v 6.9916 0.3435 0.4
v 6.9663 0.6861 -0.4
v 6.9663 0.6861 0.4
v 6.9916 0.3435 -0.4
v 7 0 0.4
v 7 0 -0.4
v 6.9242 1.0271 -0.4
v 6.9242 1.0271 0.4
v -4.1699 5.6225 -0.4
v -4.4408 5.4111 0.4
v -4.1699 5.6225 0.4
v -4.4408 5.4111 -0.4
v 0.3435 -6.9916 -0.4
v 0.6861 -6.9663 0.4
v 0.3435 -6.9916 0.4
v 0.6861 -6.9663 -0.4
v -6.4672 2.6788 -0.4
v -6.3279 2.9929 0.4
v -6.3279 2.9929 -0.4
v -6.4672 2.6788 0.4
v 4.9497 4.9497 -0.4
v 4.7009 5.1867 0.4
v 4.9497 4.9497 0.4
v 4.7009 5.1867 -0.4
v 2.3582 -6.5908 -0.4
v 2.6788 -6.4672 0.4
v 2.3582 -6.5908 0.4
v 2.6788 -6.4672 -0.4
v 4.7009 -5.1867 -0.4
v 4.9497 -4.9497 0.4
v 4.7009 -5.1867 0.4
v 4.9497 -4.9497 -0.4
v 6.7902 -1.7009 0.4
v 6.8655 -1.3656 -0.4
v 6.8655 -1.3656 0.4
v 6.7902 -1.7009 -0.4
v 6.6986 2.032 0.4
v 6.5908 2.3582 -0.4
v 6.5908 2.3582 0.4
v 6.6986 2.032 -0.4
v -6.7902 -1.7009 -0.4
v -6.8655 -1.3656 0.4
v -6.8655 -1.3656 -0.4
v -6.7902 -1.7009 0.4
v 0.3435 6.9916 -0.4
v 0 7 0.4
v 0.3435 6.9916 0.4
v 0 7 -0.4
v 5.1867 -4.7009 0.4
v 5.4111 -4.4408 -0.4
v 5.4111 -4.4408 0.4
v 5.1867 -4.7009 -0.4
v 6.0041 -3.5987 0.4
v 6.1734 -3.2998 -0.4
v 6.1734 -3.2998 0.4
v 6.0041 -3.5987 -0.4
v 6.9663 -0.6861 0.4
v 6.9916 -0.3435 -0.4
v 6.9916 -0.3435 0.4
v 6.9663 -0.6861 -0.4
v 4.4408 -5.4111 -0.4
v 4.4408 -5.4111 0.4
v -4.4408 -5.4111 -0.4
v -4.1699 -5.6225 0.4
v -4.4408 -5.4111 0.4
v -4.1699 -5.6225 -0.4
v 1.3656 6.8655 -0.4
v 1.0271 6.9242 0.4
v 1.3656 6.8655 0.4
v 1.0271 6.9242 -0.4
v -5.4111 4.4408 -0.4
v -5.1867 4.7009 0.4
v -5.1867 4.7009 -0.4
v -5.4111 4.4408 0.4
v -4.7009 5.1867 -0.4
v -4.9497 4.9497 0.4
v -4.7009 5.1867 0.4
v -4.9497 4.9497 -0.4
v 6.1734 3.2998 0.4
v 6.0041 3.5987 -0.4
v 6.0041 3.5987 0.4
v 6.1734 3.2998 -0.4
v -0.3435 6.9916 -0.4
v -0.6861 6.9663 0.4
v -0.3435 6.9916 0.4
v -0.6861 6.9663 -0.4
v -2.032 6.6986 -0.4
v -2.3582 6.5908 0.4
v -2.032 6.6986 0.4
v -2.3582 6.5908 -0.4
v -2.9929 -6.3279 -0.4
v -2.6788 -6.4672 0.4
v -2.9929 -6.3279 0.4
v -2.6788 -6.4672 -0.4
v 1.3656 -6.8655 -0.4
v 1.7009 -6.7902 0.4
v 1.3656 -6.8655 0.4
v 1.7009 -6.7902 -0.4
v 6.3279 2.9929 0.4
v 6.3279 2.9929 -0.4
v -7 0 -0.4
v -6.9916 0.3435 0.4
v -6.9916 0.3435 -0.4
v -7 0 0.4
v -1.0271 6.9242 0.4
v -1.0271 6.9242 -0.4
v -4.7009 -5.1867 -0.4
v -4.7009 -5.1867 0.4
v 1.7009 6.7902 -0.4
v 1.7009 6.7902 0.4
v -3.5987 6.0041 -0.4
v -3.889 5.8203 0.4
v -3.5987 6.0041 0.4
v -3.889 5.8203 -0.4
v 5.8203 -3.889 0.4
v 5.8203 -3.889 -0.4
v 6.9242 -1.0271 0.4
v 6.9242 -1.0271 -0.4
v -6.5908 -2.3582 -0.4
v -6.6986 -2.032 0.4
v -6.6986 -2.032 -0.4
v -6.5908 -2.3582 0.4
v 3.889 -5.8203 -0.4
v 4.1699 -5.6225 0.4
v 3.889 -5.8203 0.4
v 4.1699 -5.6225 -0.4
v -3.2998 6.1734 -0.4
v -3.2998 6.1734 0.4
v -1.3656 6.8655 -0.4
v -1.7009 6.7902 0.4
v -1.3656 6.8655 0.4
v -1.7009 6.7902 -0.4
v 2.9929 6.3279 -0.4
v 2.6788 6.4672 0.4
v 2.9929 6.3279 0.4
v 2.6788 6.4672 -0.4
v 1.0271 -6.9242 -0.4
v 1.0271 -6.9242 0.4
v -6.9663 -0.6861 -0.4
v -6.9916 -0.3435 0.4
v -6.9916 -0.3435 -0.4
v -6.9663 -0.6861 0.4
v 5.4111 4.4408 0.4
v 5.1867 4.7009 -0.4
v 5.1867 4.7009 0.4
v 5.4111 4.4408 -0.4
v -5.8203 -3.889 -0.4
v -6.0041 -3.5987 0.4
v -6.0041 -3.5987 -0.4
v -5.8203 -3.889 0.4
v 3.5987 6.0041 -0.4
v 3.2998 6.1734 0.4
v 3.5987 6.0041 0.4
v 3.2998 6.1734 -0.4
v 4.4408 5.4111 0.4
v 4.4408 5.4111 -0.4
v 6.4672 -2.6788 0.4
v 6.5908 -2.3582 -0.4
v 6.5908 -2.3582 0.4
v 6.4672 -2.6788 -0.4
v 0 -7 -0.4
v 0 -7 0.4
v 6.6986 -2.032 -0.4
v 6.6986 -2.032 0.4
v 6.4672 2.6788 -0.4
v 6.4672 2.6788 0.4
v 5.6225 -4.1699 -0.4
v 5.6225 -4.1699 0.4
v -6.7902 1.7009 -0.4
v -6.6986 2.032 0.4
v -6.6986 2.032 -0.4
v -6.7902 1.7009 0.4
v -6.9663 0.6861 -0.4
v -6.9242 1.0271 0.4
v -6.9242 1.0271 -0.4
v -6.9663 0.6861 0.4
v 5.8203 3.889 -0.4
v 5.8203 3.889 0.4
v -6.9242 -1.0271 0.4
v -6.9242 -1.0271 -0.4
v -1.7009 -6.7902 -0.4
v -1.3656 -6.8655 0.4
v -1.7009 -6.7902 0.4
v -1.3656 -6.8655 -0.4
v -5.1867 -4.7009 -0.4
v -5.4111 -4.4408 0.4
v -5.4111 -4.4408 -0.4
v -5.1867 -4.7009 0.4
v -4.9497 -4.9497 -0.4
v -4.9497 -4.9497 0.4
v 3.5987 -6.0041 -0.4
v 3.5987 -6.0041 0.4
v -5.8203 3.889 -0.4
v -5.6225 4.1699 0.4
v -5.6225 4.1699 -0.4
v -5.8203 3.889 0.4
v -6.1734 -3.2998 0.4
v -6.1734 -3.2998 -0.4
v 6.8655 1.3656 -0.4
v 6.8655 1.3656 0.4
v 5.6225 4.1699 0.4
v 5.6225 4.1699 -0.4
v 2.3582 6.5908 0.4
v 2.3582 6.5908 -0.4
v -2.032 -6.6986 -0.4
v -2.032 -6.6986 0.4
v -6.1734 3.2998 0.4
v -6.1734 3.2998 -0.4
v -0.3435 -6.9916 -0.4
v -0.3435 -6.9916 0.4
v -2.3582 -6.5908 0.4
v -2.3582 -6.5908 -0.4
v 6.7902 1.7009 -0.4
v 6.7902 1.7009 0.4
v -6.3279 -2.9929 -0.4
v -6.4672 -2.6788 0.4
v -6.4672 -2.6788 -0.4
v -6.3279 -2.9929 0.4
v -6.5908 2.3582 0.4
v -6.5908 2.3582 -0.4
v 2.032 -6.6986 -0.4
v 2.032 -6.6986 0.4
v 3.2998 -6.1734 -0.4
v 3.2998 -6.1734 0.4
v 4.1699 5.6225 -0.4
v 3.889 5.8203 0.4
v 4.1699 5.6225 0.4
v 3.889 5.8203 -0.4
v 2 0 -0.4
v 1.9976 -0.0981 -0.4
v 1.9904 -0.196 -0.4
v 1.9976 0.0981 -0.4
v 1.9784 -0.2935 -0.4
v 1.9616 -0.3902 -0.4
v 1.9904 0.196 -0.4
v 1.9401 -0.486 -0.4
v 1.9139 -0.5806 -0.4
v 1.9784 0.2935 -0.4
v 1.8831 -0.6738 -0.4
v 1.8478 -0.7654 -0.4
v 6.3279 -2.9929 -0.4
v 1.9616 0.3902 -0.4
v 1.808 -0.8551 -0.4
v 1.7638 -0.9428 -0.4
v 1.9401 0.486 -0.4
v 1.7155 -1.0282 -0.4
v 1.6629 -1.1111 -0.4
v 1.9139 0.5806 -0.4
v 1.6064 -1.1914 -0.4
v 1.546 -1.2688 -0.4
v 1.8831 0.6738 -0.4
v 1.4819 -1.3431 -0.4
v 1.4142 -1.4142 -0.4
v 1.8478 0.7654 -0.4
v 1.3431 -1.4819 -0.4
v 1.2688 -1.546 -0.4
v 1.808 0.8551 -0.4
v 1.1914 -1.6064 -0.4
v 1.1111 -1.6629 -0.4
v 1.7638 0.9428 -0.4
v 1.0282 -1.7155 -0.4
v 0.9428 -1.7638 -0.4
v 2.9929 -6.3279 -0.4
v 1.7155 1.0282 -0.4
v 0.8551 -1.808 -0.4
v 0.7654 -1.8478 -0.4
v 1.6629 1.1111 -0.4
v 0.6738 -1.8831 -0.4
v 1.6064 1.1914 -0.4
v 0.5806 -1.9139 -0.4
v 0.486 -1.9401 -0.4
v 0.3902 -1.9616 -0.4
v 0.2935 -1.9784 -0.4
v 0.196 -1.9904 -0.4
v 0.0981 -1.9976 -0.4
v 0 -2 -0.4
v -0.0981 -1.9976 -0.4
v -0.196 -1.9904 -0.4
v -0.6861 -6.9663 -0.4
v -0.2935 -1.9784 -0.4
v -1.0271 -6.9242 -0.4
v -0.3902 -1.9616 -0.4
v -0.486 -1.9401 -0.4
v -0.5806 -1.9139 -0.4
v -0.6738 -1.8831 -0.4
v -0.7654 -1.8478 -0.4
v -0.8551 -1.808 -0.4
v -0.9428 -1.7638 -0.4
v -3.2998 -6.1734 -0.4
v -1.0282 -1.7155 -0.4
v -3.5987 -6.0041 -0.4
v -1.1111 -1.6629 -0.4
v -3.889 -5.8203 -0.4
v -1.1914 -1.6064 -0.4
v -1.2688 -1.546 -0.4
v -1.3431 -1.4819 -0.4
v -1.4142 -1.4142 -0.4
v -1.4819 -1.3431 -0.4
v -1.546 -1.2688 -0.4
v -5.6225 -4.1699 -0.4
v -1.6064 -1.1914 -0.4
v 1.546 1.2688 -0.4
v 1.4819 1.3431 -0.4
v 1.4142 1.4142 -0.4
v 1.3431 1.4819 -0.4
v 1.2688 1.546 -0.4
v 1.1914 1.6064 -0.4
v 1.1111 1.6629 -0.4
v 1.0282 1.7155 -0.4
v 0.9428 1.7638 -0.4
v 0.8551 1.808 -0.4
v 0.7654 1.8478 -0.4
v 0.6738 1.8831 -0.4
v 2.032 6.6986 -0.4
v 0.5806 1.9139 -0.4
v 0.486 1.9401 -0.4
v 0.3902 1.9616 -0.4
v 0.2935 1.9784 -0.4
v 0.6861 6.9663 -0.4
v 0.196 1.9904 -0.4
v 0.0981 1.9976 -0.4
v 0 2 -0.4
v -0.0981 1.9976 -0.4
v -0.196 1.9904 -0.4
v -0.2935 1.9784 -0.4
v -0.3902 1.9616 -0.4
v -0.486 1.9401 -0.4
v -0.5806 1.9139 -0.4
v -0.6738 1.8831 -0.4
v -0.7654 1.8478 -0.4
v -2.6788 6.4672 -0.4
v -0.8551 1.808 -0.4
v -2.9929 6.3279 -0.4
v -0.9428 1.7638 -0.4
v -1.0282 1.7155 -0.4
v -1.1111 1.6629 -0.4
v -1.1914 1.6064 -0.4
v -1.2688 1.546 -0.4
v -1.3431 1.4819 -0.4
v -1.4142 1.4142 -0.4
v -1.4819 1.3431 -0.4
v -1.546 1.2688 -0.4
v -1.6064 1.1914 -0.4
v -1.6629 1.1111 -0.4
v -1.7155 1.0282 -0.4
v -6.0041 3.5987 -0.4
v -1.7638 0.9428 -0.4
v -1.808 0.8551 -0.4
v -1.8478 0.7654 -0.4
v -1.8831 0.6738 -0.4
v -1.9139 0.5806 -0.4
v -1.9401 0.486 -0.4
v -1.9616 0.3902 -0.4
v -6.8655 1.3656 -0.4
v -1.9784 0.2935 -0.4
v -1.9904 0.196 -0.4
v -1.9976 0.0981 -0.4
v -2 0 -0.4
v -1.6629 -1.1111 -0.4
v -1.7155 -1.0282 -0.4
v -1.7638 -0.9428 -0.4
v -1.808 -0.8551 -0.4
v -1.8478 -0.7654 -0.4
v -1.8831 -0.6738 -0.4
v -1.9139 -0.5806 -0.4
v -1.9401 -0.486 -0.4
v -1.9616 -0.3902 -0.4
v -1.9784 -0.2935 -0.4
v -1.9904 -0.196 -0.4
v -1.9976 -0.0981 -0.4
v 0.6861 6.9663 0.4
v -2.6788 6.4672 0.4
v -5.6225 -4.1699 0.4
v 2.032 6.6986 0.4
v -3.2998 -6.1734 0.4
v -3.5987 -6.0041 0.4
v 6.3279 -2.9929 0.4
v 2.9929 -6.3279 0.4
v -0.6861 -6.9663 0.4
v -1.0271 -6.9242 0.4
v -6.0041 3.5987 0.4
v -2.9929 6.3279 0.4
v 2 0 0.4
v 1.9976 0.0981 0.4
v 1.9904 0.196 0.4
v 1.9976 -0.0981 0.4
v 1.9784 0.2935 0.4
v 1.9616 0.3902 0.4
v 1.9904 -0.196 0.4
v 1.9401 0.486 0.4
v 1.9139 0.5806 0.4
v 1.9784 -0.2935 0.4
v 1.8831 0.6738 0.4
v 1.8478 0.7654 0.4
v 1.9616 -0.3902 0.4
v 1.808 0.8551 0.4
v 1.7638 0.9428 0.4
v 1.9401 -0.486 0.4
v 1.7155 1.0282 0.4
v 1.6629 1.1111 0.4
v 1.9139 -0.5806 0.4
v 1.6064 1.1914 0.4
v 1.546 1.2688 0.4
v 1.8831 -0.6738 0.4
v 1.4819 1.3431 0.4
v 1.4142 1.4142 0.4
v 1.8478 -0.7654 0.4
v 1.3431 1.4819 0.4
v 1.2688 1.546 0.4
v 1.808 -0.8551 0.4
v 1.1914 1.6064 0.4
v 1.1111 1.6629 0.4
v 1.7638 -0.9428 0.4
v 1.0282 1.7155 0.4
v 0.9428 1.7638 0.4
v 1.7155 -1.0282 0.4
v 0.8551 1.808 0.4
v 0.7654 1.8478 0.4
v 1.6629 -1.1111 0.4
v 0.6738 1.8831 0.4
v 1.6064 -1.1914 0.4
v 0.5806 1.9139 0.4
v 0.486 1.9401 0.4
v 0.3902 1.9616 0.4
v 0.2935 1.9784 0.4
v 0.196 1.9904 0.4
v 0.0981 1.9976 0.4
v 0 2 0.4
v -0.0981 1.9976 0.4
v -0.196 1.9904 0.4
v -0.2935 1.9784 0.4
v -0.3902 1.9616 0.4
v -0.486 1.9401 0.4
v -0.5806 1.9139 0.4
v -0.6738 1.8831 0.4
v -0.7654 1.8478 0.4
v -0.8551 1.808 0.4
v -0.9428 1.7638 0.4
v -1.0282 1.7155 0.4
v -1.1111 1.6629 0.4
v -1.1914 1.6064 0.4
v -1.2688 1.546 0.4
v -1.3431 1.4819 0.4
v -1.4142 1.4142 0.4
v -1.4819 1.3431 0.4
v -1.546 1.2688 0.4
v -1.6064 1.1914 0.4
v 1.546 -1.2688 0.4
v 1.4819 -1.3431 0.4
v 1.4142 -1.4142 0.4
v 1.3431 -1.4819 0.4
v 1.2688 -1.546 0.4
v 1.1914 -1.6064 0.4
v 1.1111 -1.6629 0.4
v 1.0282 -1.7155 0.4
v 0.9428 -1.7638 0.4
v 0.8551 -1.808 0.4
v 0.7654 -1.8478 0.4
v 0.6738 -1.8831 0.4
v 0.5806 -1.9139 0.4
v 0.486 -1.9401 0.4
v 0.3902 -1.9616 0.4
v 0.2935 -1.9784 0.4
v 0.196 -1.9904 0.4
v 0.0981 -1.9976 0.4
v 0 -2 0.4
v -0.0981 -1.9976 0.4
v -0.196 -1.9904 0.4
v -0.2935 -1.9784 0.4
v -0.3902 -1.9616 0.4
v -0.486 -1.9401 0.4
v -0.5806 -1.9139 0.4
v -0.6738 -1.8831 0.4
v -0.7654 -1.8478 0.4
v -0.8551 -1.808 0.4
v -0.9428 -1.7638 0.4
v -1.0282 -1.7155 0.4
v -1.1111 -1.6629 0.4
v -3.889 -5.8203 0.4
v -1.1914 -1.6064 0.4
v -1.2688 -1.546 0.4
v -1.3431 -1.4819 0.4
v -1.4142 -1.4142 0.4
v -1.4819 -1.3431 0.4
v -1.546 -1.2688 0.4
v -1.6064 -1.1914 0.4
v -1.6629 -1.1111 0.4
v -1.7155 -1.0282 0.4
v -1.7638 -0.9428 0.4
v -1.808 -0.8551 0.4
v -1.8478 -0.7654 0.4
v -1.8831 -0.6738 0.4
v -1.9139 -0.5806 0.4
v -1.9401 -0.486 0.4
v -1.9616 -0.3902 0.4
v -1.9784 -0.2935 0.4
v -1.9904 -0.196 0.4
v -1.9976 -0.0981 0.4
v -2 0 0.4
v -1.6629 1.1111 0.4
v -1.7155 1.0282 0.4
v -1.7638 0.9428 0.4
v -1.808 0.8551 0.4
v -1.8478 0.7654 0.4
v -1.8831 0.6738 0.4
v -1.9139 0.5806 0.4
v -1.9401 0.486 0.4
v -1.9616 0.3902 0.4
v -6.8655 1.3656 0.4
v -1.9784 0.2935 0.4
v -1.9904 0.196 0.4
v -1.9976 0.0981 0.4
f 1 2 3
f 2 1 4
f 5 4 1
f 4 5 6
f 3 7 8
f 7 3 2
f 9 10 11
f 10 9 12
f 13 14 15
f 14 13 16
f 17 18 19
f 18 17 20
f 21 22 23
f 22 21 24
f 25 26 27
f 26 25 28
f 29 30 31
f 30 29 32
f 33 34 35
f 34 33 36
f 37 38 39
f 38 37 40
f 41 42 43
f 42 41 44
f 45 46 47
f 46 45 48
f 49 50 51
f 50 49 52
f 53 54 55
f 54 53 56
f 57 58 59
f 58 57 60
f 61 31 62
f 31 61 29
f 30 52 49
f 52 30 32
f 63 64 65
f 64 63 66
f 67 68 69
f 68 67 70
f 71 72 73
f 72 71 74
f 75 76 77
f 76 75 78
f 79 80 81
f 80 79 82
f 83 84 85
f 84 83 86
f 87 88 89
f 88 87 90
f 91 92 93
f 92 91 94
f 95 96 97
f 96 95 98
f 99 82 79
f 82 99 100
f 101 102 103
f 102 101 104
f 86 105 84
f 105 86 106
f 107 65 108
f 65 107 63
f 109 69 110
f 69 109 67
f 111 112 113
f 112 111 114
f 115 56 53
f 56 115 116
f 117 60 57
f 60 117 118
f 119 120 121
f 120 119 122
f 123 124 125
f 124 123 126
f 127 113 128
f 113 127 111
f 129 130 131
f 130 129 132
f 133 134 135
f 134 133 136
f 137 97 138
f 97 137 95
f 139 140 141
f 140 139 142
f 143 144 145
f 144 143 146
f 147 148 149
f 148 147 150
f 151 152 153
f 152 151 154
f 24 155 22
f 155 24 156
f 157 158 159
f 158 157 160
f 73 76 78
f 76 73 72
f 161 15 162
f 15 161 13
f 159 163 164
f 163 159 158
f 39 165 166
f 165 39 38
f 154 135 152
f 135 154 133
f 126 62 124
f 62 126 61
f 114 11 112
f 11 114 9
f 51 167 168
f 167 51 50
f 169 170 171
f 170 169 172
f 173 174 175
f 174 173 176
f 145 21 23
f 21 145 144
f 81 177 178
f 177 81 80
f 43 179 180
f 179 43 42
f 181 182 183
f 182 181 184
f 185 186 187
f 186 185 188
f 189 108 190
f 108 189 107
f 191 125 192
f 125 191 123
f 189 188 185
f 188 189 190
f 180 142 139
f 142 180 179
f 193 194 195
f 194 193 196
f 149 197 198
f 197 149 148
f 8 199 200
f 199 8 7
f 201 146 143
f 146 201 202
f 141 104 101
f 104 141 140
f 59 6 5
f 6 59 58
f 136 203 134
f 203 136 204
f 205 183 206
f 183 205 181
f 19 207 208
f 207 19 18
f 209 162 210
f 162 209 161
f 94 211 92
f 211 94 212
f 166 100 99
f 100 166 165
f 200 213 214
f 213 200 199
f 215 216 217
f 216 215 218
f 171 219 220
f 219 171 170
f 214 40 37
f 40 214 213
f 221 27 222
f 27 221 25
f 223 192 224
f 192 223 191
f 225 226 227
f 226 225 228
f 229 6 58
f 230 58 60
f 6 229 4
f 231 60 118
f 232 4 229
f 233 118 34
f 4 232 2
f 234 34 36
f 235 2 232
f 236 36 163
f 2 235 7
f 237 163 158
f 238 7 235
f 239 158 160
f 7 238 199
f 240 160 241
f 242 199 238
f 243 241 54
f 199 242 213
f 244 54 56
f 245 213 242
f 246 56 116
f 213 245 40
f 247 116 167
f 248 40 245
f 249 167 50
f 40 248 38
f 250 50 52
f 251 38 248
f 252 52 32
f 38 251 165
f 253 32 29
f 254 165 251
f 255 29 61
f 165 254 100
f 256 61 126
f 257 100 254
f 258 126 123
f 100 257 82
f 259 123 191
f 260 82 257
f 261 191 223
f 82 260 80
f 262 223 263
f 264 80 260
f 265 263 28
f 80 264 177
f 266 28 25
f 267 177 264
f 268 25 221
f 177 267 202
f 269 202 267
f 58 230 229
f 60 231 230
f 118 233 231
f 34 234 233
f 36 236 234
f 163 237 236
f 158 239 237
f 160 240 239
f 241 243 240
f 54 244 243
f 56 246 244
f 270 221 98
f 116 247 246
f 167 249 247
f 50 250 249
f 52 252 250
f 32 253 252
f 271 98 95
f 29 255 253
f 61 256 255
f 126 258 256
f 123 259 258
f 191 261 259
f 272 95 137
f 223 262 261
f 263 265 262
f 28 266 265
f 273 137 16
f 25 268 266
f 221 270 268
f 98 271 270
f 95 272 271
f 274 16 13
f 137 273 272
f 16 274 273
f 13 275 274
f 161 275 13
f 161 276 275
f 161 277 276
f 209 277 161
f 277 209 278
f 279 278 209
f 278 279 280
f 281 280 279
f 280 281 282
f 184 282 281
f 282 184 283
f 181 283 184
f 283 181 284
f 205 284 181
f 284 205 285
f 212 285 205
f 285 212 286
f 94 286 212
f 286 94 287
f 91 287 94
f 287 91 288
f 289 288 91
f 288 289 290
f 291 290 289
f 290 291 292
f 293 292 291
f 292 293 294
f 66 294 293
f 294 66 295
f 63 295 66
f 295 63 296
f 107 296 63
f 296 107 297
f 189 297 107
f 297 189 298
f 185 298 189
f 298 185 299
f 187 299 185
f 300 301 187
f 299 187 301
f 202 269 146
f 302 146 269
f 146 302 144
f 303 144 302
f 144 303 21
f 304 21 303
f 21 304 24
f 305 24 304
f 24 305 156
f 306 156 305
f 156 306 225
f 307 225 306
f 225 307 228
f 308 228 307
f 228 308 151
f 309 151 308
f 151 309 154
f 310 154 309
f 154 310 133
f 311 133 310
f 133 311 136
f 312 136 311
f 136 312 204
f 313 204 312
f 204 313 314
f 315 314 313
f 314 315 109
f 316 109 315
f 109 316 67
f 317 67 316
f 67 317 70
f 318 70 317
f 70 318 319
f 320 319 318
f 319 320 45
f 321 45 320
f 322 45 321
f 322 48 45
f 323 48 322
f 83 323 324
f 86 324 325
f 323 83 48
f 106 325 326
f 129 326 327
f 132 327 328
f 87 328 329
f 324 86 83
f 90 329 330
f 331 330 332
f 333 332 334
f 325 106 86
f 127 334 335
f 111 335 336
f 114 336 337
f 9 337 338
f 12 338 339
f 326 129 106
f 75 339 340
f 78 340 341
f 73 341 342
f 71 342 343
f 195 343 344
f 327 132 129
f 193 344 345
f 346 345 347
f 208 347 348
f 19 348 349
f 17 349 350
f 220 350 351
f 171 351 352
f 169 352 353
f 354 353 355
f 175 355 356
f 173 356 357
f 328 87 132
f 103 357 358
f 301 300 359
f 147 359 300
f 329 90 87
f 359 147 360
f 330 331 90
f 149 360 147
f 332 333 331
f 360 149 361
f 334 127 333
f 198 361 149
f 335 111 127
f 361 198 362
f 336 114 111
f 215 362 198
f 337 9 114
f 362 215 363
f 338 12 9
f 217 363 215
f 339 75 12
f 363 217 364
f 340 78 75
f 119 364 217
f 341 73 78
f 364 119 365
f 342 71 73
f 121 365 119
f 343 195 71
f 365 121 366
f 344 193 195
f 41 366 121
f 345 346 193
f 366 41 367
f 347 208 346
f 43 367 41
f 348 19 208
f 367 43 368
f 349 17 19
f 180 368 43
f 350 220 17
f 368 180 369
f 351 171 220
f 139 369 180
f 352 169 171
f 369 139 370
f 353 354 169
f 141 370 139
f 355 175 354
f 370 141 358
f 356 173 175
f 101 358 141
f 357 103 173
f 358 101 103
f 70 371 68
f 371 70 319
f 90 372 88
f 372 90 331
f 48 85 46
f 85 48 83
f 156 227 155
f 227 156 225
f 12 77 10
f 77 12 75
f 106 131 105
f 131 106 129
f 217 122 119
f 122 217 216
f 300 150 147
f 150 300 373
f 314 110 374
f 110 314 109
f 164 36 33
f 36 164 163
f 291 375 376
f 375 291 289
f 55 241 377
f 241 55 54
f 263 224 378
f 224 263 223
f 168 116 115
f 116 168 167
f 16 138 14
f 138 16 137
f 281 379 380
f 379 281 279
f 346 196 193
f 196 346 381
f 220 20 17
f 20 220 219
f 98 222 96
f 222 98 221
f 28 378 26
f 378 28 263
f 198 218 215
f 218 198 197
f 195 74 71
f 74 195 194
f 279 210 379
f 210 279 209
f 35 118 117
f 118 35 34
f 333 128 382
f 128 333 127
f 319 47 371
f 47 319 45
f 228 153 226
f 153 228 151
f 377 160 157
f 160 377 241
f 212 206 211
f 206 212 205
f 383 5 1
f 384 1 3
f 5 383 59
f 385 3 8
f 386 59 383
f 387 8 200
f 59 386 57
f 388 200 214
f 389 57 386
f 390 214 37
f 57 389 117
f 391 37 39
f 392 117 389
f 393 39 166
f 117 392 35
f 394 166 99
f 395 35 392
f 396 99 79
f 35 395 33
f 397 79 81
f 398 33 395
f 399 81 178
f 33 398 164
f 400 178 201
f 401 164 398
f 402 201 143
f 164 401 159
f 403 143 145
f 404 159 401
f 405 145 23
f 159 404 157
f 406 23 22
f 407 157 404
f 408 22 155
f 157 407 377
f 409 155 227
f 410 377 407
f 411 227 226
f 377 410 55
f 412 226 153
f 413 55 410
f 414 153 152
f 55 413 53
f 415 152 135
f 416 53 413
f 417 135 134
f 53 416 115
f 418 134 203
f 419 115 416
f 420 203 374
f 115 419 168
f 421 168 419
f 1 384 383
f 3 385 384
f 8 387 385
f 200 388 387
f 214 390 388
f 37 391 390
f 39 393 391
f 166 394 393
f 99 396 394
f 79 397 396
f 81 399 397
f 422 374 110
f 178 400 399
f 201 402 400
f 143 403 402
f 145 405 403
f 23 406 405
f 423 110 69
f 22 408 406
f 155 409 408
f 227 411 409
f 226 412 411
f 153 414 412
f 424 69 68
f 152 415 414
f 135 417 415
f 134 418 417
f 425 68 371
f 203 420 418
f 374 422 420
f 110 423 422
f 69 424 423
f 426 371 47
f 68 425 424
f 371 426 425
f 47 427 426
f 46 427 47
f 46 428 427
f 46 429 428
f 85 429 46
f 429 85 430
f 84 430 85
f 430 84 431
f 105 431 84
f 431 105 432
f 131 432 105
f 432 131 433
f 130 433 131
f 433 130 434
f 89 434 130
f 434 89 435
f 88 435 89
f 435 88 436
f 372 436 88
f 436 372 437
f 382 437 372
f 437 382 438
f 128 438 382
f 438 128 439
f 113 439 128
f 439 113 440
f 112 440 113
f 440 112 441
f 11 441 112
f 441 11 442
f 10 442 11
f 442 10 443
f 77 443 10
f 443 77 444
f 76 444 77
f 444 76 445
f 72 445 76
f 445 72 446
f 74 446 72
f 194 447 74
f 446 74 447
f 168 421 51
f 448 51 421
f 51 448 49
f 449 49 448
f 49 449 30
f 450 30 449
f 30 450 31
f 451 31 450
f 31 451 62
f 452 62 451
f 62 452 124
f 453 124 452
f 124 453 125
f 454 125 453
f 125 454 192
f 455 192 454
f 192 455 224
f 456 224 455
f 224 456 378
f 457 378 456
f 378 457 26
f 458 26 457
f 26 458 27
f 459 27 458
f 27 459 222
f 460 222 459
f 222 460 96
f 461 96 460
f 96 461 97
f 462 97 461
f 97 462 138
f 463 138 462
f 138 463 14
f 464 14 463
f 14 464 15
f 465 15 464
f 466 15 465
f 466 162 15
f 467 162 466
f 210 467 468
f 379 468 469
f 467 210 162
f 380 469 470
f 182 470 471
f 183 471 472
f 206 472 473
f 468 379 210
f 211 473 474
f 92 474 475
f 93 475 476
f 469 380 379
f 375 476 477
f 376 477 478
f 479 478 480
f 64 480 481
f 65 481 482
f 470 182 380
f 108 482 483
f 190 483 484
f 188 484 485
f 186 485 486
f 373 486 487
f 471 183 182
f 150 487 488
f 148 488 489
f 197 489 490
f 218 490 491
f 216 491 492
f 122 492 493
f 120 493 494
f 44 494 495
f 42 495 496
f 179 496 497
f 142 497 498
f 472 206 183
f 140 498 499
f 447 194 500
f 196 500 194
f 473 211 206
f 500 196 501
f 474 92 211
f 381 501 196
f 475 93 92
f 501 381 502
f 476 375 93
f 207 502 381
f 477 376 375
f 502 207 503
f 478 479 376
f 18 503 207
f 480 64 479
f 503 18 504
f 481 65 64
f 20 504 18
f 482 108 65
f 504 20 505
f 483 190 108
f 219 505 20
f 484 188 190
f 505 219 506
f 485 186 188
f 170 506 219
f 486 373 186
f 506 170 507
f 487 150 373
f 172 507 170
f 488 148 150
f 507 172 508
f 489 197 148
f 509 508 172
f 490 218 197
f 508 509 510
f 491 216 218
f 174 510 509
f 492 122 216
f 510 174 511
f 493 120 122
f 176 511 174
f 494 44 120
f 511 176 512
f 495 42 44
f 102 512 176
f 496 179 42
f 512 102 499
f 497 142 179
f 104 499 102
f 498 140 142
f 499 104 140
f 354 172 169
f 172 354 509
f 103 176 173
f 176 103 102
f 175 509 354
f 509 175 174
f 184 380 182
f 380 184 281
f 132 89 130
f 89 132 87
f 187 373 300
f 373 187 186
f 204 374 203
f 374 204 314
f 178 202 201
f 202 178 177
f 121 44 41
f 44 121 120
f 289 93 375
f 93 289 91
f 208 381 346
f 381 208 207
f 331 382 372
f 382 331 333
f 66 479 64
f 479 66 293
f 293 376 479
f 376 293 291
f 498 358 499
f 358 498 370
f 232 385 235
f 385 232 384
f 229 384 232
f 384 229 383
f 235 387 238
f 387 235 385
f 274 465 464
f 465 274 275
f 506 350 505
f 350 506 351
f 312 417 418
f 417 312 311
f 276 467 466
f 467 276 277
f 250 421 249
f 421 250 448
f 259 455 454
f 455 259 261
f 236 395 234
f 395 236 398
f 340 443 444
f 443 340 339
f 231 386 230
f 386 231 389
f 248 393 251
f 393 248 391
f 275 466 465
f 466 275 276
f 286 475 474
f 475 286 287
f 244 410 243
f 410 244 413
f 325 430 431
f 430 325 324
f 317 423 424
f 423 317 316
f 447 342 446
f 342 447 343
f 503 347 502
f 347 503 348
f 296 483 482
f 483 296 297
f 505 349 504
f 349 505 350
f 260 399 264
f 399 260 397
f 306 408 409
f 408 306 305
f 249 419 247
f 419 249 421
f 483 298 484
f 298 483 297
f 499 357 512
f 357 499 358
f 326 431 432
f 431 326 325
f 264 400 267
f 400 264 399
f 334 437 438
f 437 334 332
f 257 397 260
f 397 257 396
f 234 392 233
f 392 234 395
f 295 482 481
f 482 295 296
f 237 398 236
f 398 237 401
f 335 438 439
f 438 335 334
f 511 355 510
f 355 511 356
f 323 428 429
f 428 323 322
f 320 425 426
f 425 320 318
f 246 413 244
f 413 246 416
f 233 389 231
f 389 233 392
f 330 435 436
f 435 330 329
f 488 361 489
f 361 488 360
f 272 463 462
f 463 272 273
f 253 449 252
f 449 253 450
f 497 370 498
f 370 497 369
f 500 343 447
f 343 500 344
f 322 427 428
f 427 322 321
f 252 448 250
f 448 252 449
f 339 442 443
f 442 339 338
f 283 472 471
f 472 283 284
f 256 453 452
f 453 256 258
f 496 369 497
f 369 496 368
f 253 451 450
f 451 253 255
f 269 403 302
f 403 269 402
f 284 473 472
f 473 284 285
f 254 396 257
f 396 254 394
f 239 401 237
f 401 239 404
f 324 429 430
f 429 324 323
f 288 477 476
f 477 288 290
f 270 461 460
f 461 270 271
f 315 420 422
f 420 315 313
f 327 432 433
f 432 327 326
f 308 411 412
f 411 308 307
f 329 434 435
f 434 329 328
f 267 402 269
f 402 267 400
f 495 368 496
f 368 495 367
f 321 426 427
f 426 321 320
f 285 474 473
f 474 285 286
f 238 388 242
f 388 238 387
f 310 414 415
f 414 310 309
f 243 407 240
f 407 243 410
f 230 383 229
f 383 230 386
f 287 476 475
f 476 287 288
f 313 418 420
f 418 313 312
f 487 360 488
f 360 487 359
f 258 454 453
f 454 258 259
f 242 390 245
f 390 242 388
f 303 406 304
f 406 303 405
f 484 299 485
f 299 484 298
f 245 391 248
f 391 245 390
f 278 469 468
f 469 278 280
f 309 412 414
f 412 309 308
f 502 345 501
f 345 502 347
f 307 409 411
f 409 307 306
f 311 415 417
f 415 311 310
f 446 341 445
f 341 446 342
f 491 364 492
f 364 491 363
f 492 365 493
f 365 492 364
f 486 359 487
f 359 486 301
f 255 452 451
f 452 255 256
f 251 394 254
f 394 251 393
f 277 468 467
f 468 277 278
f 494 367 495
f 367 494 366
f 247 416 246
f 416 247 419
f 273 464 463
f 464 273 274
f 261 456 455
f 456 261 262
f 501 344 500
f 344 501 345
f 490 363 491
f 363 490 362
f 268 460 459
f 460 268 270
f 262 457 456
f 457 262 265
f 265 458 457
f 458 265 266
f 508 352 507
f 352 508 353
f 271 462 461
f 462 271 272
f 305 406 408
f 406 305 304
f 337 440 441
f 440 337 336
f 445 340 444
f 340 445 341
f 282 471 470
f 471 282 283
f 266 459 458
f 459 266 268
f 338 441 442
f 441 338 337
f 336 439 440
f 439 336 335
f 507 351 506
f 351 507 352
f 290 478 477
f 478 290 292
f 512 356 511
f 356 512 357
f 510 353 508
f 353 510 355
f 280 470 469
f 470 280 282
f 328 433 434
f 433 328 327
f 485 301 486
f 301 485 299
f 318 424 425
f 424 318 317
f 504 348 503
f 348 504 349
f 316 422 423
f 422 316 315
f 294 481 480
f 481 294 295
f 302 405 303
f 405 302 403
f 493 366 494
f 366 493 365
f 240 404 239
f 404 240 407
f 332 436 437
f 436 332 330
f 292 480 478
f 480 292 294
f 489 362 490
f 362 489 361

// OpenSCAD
// Penny washer parameters (mm)
inner_diameter_mm = 4.0;   //[2.0:8.0:0.1]
outer_diameter_mm = 14.0;  //[7.0:28.0:0.1]
thickness_mm      = 0.8;   //[0.4:1.6:0.05]
eps_mm            = 0.2;   //[0.05:0.5:0.05]

$fn = 128;

module penny_washer(id=inner_diameter_mm, od=outer_diameter_mm, t=thickness_mm, eps=eps_mm) {
    difference() {
        cylinder(d=od, h=t, center=true);
        cylinder(d=id, h=t + 2*eps, center=true);
    }
}

// Single connected solid: just the washer
penny_washer();
